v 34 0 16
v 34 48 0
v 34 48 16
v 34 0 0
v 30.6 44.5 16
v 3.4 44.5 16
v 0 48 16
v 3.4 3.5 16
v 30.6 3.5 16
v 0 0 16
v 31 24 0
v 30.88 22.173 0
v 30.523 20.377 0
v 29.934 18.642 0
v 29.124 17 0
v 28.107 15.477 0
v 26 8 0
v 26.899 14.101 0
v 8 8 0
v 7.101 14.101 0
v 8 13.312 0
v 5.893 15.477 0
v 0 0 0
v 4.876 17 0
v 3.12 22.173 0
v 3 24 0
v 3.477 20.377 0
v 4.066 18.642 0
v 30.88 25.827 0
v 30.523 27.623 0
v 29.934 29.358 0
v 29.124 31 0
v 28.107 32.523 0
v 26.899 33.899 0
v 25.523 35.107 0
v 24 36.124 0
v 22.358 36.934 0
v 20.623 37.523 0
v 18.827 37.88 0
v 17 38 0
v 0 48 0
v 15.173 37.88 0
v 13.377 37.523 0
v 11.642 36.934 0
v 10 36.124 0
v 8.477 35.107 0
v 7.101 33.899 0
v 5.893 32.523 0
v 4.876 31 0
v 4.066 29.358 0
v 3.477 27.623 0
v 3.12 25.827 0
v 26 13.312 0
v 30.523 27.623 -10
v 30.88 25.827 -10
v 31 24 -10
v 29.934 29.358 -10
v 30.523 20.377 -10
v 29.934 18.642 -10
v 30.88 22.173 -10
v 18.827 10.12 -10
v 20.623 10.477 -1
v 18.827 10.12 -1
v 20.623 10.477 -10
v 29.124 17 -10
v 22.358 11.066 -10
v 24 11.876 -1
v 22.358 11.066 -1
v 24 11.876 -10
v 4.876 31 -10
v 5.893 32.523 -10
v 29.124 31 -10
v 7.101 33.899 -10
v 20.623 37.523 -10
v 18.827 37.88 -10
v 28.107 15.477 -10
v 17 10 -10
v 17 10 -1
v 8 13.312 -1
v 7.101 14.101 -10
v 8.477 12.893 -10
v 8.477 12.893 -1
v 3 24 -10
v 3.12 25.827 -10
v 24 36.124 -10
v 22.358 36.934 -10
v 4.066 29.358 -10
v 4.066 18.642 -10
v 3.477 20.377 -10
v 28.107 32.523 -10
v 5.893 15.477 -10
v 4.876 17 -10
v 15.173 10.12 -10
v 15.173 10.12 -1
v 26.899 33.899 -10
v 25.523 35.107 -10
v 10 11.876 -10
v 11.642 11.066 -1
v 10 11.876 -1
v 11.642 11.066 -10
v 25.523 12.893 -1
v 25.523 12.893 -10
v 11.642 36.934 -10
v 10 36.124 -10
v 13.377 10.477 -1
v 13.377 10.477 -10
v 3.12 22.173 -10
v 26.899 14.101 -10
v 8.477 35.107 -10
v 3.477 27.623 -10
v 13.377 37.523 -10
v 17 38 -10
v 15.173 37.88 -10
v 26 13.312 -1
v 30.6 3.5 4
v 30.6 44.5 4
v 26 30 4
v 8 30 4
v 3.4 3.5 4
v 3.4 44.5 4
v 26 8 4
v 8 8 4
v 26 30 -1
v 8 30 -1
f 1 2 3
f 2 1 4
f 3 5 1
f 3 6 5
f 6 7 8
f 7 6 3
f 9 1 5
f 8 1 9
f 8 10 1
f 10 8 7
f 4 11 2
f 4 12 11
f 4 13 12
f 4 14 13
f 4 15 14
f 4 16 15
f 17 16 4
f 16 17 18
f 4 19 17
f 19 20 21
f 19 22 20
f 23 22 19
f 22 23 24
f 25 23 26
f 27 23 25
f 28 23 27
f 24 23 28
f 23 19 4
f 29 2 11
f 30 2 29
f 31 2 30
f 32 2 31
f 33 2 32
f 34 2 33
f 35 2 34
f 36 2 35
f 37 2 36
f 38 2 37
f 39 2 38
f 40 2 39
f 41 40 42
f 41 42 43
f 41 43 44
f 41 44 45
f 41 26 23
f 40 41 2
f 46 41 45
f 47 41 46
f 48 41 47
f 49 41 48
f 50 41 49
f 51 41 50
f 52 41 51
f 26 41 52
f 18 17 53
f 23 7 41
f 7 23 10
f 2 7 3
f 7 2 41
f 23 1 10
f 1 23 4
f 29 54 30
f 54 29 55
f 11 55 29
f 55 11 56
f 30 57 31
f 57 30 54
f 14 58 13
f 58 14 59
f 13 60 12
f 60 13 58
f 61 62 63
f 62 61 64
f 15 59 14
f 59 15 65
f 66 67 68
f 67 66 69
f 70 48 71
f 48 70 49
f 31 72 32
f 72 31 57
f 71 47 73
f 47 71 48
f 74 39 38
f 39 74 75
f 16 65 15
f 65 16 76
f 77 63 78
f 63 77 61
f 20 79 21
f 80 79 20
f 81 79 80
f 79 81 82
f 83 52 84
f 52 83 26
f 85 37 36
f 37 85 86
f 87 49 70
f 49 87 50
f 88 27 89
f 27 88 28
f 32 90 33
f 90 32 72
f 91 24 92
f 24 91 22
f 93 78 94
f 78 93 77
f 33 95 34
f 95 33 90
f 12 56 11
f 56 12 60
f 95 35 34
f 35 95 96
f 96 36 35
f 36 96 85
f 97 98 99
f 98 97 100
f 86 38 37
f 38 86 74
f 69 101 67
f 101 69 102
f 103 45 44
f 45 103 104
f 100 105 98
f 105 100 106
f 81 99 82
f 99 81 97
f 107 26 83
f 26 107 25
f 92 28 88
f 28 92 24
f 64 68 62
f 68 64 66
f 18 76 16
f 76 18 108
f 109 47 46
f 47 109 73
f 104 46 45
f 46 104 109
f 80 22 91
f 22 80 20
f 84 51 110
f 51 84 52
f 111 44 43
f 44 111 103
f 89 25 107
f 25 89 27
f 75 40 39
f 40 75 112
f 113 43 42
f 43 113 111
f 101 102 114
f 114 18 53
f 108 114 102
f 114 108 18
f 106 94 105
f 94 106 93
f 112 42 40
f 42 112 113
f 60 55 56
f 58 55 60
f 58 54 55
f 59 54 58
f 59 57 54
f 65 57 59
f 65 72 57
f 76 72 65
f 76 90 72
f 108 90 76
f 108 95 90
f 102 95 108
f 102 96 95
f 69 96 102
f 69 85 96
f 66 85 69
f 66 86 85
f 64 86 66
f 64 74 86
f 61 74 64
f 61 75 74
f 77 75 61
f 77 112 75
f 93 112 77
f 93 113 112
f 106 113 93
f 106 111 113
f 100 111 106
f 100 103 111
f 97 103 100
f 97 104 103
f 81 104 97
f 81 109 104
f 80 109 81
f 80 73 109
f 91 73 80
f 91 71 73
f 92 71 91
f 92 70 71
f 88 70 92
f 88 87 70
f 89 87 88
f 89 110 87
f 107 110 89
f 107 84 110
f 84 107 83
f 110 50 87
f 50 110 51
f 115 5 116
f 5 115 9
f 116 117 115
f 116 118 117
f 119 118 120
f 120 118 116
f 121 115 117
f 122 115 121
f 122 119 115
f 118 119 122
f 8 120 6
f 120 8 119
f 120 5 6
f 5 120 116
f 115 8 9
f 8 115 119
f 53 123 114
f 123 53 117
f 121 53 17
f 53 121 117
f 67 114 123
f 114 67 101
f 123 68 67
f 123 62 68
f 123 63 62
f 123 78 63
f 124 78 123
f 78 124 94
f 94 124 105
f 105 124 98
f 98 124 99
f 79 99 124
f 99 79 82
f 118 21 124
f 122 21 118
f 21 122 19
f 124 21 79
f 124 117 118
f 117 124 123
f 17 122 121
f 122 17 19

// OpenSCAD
// cad/mounts_opcionais/camera_mount_esp32cam.scad — Pan-Tilt Indexado 15 deg (Surveillance Robot)
$fn = 48;

module camera_mount_pan_tilt() {
    difference() {
        union() {
            cube([34, 48, 16]);
            translate([17, 24, -10]) cylinder(r = 14, h = 10); // Colar Pan
        }
        // Cavidade PCB ESP32-CAM (27.2 x 41.0 mm) + Ventilacao traseira
        translate([3.4, 3.5, 4]) cube([27.2, 41.0, 13]);
        translate([8, 8, -1]) cube([18, 22, 6]);
        // Lente OV2640 frontal (quando tampado/invertido) + indexacao 15 deg
        for (a = [0 : 15 : 165]) {
            rotate([0, 0, a]) translate([11, 0, -11]) cylinder(r = 1.2, h = 6);
        }
    }
}

camera_mount_pan_tilt();
